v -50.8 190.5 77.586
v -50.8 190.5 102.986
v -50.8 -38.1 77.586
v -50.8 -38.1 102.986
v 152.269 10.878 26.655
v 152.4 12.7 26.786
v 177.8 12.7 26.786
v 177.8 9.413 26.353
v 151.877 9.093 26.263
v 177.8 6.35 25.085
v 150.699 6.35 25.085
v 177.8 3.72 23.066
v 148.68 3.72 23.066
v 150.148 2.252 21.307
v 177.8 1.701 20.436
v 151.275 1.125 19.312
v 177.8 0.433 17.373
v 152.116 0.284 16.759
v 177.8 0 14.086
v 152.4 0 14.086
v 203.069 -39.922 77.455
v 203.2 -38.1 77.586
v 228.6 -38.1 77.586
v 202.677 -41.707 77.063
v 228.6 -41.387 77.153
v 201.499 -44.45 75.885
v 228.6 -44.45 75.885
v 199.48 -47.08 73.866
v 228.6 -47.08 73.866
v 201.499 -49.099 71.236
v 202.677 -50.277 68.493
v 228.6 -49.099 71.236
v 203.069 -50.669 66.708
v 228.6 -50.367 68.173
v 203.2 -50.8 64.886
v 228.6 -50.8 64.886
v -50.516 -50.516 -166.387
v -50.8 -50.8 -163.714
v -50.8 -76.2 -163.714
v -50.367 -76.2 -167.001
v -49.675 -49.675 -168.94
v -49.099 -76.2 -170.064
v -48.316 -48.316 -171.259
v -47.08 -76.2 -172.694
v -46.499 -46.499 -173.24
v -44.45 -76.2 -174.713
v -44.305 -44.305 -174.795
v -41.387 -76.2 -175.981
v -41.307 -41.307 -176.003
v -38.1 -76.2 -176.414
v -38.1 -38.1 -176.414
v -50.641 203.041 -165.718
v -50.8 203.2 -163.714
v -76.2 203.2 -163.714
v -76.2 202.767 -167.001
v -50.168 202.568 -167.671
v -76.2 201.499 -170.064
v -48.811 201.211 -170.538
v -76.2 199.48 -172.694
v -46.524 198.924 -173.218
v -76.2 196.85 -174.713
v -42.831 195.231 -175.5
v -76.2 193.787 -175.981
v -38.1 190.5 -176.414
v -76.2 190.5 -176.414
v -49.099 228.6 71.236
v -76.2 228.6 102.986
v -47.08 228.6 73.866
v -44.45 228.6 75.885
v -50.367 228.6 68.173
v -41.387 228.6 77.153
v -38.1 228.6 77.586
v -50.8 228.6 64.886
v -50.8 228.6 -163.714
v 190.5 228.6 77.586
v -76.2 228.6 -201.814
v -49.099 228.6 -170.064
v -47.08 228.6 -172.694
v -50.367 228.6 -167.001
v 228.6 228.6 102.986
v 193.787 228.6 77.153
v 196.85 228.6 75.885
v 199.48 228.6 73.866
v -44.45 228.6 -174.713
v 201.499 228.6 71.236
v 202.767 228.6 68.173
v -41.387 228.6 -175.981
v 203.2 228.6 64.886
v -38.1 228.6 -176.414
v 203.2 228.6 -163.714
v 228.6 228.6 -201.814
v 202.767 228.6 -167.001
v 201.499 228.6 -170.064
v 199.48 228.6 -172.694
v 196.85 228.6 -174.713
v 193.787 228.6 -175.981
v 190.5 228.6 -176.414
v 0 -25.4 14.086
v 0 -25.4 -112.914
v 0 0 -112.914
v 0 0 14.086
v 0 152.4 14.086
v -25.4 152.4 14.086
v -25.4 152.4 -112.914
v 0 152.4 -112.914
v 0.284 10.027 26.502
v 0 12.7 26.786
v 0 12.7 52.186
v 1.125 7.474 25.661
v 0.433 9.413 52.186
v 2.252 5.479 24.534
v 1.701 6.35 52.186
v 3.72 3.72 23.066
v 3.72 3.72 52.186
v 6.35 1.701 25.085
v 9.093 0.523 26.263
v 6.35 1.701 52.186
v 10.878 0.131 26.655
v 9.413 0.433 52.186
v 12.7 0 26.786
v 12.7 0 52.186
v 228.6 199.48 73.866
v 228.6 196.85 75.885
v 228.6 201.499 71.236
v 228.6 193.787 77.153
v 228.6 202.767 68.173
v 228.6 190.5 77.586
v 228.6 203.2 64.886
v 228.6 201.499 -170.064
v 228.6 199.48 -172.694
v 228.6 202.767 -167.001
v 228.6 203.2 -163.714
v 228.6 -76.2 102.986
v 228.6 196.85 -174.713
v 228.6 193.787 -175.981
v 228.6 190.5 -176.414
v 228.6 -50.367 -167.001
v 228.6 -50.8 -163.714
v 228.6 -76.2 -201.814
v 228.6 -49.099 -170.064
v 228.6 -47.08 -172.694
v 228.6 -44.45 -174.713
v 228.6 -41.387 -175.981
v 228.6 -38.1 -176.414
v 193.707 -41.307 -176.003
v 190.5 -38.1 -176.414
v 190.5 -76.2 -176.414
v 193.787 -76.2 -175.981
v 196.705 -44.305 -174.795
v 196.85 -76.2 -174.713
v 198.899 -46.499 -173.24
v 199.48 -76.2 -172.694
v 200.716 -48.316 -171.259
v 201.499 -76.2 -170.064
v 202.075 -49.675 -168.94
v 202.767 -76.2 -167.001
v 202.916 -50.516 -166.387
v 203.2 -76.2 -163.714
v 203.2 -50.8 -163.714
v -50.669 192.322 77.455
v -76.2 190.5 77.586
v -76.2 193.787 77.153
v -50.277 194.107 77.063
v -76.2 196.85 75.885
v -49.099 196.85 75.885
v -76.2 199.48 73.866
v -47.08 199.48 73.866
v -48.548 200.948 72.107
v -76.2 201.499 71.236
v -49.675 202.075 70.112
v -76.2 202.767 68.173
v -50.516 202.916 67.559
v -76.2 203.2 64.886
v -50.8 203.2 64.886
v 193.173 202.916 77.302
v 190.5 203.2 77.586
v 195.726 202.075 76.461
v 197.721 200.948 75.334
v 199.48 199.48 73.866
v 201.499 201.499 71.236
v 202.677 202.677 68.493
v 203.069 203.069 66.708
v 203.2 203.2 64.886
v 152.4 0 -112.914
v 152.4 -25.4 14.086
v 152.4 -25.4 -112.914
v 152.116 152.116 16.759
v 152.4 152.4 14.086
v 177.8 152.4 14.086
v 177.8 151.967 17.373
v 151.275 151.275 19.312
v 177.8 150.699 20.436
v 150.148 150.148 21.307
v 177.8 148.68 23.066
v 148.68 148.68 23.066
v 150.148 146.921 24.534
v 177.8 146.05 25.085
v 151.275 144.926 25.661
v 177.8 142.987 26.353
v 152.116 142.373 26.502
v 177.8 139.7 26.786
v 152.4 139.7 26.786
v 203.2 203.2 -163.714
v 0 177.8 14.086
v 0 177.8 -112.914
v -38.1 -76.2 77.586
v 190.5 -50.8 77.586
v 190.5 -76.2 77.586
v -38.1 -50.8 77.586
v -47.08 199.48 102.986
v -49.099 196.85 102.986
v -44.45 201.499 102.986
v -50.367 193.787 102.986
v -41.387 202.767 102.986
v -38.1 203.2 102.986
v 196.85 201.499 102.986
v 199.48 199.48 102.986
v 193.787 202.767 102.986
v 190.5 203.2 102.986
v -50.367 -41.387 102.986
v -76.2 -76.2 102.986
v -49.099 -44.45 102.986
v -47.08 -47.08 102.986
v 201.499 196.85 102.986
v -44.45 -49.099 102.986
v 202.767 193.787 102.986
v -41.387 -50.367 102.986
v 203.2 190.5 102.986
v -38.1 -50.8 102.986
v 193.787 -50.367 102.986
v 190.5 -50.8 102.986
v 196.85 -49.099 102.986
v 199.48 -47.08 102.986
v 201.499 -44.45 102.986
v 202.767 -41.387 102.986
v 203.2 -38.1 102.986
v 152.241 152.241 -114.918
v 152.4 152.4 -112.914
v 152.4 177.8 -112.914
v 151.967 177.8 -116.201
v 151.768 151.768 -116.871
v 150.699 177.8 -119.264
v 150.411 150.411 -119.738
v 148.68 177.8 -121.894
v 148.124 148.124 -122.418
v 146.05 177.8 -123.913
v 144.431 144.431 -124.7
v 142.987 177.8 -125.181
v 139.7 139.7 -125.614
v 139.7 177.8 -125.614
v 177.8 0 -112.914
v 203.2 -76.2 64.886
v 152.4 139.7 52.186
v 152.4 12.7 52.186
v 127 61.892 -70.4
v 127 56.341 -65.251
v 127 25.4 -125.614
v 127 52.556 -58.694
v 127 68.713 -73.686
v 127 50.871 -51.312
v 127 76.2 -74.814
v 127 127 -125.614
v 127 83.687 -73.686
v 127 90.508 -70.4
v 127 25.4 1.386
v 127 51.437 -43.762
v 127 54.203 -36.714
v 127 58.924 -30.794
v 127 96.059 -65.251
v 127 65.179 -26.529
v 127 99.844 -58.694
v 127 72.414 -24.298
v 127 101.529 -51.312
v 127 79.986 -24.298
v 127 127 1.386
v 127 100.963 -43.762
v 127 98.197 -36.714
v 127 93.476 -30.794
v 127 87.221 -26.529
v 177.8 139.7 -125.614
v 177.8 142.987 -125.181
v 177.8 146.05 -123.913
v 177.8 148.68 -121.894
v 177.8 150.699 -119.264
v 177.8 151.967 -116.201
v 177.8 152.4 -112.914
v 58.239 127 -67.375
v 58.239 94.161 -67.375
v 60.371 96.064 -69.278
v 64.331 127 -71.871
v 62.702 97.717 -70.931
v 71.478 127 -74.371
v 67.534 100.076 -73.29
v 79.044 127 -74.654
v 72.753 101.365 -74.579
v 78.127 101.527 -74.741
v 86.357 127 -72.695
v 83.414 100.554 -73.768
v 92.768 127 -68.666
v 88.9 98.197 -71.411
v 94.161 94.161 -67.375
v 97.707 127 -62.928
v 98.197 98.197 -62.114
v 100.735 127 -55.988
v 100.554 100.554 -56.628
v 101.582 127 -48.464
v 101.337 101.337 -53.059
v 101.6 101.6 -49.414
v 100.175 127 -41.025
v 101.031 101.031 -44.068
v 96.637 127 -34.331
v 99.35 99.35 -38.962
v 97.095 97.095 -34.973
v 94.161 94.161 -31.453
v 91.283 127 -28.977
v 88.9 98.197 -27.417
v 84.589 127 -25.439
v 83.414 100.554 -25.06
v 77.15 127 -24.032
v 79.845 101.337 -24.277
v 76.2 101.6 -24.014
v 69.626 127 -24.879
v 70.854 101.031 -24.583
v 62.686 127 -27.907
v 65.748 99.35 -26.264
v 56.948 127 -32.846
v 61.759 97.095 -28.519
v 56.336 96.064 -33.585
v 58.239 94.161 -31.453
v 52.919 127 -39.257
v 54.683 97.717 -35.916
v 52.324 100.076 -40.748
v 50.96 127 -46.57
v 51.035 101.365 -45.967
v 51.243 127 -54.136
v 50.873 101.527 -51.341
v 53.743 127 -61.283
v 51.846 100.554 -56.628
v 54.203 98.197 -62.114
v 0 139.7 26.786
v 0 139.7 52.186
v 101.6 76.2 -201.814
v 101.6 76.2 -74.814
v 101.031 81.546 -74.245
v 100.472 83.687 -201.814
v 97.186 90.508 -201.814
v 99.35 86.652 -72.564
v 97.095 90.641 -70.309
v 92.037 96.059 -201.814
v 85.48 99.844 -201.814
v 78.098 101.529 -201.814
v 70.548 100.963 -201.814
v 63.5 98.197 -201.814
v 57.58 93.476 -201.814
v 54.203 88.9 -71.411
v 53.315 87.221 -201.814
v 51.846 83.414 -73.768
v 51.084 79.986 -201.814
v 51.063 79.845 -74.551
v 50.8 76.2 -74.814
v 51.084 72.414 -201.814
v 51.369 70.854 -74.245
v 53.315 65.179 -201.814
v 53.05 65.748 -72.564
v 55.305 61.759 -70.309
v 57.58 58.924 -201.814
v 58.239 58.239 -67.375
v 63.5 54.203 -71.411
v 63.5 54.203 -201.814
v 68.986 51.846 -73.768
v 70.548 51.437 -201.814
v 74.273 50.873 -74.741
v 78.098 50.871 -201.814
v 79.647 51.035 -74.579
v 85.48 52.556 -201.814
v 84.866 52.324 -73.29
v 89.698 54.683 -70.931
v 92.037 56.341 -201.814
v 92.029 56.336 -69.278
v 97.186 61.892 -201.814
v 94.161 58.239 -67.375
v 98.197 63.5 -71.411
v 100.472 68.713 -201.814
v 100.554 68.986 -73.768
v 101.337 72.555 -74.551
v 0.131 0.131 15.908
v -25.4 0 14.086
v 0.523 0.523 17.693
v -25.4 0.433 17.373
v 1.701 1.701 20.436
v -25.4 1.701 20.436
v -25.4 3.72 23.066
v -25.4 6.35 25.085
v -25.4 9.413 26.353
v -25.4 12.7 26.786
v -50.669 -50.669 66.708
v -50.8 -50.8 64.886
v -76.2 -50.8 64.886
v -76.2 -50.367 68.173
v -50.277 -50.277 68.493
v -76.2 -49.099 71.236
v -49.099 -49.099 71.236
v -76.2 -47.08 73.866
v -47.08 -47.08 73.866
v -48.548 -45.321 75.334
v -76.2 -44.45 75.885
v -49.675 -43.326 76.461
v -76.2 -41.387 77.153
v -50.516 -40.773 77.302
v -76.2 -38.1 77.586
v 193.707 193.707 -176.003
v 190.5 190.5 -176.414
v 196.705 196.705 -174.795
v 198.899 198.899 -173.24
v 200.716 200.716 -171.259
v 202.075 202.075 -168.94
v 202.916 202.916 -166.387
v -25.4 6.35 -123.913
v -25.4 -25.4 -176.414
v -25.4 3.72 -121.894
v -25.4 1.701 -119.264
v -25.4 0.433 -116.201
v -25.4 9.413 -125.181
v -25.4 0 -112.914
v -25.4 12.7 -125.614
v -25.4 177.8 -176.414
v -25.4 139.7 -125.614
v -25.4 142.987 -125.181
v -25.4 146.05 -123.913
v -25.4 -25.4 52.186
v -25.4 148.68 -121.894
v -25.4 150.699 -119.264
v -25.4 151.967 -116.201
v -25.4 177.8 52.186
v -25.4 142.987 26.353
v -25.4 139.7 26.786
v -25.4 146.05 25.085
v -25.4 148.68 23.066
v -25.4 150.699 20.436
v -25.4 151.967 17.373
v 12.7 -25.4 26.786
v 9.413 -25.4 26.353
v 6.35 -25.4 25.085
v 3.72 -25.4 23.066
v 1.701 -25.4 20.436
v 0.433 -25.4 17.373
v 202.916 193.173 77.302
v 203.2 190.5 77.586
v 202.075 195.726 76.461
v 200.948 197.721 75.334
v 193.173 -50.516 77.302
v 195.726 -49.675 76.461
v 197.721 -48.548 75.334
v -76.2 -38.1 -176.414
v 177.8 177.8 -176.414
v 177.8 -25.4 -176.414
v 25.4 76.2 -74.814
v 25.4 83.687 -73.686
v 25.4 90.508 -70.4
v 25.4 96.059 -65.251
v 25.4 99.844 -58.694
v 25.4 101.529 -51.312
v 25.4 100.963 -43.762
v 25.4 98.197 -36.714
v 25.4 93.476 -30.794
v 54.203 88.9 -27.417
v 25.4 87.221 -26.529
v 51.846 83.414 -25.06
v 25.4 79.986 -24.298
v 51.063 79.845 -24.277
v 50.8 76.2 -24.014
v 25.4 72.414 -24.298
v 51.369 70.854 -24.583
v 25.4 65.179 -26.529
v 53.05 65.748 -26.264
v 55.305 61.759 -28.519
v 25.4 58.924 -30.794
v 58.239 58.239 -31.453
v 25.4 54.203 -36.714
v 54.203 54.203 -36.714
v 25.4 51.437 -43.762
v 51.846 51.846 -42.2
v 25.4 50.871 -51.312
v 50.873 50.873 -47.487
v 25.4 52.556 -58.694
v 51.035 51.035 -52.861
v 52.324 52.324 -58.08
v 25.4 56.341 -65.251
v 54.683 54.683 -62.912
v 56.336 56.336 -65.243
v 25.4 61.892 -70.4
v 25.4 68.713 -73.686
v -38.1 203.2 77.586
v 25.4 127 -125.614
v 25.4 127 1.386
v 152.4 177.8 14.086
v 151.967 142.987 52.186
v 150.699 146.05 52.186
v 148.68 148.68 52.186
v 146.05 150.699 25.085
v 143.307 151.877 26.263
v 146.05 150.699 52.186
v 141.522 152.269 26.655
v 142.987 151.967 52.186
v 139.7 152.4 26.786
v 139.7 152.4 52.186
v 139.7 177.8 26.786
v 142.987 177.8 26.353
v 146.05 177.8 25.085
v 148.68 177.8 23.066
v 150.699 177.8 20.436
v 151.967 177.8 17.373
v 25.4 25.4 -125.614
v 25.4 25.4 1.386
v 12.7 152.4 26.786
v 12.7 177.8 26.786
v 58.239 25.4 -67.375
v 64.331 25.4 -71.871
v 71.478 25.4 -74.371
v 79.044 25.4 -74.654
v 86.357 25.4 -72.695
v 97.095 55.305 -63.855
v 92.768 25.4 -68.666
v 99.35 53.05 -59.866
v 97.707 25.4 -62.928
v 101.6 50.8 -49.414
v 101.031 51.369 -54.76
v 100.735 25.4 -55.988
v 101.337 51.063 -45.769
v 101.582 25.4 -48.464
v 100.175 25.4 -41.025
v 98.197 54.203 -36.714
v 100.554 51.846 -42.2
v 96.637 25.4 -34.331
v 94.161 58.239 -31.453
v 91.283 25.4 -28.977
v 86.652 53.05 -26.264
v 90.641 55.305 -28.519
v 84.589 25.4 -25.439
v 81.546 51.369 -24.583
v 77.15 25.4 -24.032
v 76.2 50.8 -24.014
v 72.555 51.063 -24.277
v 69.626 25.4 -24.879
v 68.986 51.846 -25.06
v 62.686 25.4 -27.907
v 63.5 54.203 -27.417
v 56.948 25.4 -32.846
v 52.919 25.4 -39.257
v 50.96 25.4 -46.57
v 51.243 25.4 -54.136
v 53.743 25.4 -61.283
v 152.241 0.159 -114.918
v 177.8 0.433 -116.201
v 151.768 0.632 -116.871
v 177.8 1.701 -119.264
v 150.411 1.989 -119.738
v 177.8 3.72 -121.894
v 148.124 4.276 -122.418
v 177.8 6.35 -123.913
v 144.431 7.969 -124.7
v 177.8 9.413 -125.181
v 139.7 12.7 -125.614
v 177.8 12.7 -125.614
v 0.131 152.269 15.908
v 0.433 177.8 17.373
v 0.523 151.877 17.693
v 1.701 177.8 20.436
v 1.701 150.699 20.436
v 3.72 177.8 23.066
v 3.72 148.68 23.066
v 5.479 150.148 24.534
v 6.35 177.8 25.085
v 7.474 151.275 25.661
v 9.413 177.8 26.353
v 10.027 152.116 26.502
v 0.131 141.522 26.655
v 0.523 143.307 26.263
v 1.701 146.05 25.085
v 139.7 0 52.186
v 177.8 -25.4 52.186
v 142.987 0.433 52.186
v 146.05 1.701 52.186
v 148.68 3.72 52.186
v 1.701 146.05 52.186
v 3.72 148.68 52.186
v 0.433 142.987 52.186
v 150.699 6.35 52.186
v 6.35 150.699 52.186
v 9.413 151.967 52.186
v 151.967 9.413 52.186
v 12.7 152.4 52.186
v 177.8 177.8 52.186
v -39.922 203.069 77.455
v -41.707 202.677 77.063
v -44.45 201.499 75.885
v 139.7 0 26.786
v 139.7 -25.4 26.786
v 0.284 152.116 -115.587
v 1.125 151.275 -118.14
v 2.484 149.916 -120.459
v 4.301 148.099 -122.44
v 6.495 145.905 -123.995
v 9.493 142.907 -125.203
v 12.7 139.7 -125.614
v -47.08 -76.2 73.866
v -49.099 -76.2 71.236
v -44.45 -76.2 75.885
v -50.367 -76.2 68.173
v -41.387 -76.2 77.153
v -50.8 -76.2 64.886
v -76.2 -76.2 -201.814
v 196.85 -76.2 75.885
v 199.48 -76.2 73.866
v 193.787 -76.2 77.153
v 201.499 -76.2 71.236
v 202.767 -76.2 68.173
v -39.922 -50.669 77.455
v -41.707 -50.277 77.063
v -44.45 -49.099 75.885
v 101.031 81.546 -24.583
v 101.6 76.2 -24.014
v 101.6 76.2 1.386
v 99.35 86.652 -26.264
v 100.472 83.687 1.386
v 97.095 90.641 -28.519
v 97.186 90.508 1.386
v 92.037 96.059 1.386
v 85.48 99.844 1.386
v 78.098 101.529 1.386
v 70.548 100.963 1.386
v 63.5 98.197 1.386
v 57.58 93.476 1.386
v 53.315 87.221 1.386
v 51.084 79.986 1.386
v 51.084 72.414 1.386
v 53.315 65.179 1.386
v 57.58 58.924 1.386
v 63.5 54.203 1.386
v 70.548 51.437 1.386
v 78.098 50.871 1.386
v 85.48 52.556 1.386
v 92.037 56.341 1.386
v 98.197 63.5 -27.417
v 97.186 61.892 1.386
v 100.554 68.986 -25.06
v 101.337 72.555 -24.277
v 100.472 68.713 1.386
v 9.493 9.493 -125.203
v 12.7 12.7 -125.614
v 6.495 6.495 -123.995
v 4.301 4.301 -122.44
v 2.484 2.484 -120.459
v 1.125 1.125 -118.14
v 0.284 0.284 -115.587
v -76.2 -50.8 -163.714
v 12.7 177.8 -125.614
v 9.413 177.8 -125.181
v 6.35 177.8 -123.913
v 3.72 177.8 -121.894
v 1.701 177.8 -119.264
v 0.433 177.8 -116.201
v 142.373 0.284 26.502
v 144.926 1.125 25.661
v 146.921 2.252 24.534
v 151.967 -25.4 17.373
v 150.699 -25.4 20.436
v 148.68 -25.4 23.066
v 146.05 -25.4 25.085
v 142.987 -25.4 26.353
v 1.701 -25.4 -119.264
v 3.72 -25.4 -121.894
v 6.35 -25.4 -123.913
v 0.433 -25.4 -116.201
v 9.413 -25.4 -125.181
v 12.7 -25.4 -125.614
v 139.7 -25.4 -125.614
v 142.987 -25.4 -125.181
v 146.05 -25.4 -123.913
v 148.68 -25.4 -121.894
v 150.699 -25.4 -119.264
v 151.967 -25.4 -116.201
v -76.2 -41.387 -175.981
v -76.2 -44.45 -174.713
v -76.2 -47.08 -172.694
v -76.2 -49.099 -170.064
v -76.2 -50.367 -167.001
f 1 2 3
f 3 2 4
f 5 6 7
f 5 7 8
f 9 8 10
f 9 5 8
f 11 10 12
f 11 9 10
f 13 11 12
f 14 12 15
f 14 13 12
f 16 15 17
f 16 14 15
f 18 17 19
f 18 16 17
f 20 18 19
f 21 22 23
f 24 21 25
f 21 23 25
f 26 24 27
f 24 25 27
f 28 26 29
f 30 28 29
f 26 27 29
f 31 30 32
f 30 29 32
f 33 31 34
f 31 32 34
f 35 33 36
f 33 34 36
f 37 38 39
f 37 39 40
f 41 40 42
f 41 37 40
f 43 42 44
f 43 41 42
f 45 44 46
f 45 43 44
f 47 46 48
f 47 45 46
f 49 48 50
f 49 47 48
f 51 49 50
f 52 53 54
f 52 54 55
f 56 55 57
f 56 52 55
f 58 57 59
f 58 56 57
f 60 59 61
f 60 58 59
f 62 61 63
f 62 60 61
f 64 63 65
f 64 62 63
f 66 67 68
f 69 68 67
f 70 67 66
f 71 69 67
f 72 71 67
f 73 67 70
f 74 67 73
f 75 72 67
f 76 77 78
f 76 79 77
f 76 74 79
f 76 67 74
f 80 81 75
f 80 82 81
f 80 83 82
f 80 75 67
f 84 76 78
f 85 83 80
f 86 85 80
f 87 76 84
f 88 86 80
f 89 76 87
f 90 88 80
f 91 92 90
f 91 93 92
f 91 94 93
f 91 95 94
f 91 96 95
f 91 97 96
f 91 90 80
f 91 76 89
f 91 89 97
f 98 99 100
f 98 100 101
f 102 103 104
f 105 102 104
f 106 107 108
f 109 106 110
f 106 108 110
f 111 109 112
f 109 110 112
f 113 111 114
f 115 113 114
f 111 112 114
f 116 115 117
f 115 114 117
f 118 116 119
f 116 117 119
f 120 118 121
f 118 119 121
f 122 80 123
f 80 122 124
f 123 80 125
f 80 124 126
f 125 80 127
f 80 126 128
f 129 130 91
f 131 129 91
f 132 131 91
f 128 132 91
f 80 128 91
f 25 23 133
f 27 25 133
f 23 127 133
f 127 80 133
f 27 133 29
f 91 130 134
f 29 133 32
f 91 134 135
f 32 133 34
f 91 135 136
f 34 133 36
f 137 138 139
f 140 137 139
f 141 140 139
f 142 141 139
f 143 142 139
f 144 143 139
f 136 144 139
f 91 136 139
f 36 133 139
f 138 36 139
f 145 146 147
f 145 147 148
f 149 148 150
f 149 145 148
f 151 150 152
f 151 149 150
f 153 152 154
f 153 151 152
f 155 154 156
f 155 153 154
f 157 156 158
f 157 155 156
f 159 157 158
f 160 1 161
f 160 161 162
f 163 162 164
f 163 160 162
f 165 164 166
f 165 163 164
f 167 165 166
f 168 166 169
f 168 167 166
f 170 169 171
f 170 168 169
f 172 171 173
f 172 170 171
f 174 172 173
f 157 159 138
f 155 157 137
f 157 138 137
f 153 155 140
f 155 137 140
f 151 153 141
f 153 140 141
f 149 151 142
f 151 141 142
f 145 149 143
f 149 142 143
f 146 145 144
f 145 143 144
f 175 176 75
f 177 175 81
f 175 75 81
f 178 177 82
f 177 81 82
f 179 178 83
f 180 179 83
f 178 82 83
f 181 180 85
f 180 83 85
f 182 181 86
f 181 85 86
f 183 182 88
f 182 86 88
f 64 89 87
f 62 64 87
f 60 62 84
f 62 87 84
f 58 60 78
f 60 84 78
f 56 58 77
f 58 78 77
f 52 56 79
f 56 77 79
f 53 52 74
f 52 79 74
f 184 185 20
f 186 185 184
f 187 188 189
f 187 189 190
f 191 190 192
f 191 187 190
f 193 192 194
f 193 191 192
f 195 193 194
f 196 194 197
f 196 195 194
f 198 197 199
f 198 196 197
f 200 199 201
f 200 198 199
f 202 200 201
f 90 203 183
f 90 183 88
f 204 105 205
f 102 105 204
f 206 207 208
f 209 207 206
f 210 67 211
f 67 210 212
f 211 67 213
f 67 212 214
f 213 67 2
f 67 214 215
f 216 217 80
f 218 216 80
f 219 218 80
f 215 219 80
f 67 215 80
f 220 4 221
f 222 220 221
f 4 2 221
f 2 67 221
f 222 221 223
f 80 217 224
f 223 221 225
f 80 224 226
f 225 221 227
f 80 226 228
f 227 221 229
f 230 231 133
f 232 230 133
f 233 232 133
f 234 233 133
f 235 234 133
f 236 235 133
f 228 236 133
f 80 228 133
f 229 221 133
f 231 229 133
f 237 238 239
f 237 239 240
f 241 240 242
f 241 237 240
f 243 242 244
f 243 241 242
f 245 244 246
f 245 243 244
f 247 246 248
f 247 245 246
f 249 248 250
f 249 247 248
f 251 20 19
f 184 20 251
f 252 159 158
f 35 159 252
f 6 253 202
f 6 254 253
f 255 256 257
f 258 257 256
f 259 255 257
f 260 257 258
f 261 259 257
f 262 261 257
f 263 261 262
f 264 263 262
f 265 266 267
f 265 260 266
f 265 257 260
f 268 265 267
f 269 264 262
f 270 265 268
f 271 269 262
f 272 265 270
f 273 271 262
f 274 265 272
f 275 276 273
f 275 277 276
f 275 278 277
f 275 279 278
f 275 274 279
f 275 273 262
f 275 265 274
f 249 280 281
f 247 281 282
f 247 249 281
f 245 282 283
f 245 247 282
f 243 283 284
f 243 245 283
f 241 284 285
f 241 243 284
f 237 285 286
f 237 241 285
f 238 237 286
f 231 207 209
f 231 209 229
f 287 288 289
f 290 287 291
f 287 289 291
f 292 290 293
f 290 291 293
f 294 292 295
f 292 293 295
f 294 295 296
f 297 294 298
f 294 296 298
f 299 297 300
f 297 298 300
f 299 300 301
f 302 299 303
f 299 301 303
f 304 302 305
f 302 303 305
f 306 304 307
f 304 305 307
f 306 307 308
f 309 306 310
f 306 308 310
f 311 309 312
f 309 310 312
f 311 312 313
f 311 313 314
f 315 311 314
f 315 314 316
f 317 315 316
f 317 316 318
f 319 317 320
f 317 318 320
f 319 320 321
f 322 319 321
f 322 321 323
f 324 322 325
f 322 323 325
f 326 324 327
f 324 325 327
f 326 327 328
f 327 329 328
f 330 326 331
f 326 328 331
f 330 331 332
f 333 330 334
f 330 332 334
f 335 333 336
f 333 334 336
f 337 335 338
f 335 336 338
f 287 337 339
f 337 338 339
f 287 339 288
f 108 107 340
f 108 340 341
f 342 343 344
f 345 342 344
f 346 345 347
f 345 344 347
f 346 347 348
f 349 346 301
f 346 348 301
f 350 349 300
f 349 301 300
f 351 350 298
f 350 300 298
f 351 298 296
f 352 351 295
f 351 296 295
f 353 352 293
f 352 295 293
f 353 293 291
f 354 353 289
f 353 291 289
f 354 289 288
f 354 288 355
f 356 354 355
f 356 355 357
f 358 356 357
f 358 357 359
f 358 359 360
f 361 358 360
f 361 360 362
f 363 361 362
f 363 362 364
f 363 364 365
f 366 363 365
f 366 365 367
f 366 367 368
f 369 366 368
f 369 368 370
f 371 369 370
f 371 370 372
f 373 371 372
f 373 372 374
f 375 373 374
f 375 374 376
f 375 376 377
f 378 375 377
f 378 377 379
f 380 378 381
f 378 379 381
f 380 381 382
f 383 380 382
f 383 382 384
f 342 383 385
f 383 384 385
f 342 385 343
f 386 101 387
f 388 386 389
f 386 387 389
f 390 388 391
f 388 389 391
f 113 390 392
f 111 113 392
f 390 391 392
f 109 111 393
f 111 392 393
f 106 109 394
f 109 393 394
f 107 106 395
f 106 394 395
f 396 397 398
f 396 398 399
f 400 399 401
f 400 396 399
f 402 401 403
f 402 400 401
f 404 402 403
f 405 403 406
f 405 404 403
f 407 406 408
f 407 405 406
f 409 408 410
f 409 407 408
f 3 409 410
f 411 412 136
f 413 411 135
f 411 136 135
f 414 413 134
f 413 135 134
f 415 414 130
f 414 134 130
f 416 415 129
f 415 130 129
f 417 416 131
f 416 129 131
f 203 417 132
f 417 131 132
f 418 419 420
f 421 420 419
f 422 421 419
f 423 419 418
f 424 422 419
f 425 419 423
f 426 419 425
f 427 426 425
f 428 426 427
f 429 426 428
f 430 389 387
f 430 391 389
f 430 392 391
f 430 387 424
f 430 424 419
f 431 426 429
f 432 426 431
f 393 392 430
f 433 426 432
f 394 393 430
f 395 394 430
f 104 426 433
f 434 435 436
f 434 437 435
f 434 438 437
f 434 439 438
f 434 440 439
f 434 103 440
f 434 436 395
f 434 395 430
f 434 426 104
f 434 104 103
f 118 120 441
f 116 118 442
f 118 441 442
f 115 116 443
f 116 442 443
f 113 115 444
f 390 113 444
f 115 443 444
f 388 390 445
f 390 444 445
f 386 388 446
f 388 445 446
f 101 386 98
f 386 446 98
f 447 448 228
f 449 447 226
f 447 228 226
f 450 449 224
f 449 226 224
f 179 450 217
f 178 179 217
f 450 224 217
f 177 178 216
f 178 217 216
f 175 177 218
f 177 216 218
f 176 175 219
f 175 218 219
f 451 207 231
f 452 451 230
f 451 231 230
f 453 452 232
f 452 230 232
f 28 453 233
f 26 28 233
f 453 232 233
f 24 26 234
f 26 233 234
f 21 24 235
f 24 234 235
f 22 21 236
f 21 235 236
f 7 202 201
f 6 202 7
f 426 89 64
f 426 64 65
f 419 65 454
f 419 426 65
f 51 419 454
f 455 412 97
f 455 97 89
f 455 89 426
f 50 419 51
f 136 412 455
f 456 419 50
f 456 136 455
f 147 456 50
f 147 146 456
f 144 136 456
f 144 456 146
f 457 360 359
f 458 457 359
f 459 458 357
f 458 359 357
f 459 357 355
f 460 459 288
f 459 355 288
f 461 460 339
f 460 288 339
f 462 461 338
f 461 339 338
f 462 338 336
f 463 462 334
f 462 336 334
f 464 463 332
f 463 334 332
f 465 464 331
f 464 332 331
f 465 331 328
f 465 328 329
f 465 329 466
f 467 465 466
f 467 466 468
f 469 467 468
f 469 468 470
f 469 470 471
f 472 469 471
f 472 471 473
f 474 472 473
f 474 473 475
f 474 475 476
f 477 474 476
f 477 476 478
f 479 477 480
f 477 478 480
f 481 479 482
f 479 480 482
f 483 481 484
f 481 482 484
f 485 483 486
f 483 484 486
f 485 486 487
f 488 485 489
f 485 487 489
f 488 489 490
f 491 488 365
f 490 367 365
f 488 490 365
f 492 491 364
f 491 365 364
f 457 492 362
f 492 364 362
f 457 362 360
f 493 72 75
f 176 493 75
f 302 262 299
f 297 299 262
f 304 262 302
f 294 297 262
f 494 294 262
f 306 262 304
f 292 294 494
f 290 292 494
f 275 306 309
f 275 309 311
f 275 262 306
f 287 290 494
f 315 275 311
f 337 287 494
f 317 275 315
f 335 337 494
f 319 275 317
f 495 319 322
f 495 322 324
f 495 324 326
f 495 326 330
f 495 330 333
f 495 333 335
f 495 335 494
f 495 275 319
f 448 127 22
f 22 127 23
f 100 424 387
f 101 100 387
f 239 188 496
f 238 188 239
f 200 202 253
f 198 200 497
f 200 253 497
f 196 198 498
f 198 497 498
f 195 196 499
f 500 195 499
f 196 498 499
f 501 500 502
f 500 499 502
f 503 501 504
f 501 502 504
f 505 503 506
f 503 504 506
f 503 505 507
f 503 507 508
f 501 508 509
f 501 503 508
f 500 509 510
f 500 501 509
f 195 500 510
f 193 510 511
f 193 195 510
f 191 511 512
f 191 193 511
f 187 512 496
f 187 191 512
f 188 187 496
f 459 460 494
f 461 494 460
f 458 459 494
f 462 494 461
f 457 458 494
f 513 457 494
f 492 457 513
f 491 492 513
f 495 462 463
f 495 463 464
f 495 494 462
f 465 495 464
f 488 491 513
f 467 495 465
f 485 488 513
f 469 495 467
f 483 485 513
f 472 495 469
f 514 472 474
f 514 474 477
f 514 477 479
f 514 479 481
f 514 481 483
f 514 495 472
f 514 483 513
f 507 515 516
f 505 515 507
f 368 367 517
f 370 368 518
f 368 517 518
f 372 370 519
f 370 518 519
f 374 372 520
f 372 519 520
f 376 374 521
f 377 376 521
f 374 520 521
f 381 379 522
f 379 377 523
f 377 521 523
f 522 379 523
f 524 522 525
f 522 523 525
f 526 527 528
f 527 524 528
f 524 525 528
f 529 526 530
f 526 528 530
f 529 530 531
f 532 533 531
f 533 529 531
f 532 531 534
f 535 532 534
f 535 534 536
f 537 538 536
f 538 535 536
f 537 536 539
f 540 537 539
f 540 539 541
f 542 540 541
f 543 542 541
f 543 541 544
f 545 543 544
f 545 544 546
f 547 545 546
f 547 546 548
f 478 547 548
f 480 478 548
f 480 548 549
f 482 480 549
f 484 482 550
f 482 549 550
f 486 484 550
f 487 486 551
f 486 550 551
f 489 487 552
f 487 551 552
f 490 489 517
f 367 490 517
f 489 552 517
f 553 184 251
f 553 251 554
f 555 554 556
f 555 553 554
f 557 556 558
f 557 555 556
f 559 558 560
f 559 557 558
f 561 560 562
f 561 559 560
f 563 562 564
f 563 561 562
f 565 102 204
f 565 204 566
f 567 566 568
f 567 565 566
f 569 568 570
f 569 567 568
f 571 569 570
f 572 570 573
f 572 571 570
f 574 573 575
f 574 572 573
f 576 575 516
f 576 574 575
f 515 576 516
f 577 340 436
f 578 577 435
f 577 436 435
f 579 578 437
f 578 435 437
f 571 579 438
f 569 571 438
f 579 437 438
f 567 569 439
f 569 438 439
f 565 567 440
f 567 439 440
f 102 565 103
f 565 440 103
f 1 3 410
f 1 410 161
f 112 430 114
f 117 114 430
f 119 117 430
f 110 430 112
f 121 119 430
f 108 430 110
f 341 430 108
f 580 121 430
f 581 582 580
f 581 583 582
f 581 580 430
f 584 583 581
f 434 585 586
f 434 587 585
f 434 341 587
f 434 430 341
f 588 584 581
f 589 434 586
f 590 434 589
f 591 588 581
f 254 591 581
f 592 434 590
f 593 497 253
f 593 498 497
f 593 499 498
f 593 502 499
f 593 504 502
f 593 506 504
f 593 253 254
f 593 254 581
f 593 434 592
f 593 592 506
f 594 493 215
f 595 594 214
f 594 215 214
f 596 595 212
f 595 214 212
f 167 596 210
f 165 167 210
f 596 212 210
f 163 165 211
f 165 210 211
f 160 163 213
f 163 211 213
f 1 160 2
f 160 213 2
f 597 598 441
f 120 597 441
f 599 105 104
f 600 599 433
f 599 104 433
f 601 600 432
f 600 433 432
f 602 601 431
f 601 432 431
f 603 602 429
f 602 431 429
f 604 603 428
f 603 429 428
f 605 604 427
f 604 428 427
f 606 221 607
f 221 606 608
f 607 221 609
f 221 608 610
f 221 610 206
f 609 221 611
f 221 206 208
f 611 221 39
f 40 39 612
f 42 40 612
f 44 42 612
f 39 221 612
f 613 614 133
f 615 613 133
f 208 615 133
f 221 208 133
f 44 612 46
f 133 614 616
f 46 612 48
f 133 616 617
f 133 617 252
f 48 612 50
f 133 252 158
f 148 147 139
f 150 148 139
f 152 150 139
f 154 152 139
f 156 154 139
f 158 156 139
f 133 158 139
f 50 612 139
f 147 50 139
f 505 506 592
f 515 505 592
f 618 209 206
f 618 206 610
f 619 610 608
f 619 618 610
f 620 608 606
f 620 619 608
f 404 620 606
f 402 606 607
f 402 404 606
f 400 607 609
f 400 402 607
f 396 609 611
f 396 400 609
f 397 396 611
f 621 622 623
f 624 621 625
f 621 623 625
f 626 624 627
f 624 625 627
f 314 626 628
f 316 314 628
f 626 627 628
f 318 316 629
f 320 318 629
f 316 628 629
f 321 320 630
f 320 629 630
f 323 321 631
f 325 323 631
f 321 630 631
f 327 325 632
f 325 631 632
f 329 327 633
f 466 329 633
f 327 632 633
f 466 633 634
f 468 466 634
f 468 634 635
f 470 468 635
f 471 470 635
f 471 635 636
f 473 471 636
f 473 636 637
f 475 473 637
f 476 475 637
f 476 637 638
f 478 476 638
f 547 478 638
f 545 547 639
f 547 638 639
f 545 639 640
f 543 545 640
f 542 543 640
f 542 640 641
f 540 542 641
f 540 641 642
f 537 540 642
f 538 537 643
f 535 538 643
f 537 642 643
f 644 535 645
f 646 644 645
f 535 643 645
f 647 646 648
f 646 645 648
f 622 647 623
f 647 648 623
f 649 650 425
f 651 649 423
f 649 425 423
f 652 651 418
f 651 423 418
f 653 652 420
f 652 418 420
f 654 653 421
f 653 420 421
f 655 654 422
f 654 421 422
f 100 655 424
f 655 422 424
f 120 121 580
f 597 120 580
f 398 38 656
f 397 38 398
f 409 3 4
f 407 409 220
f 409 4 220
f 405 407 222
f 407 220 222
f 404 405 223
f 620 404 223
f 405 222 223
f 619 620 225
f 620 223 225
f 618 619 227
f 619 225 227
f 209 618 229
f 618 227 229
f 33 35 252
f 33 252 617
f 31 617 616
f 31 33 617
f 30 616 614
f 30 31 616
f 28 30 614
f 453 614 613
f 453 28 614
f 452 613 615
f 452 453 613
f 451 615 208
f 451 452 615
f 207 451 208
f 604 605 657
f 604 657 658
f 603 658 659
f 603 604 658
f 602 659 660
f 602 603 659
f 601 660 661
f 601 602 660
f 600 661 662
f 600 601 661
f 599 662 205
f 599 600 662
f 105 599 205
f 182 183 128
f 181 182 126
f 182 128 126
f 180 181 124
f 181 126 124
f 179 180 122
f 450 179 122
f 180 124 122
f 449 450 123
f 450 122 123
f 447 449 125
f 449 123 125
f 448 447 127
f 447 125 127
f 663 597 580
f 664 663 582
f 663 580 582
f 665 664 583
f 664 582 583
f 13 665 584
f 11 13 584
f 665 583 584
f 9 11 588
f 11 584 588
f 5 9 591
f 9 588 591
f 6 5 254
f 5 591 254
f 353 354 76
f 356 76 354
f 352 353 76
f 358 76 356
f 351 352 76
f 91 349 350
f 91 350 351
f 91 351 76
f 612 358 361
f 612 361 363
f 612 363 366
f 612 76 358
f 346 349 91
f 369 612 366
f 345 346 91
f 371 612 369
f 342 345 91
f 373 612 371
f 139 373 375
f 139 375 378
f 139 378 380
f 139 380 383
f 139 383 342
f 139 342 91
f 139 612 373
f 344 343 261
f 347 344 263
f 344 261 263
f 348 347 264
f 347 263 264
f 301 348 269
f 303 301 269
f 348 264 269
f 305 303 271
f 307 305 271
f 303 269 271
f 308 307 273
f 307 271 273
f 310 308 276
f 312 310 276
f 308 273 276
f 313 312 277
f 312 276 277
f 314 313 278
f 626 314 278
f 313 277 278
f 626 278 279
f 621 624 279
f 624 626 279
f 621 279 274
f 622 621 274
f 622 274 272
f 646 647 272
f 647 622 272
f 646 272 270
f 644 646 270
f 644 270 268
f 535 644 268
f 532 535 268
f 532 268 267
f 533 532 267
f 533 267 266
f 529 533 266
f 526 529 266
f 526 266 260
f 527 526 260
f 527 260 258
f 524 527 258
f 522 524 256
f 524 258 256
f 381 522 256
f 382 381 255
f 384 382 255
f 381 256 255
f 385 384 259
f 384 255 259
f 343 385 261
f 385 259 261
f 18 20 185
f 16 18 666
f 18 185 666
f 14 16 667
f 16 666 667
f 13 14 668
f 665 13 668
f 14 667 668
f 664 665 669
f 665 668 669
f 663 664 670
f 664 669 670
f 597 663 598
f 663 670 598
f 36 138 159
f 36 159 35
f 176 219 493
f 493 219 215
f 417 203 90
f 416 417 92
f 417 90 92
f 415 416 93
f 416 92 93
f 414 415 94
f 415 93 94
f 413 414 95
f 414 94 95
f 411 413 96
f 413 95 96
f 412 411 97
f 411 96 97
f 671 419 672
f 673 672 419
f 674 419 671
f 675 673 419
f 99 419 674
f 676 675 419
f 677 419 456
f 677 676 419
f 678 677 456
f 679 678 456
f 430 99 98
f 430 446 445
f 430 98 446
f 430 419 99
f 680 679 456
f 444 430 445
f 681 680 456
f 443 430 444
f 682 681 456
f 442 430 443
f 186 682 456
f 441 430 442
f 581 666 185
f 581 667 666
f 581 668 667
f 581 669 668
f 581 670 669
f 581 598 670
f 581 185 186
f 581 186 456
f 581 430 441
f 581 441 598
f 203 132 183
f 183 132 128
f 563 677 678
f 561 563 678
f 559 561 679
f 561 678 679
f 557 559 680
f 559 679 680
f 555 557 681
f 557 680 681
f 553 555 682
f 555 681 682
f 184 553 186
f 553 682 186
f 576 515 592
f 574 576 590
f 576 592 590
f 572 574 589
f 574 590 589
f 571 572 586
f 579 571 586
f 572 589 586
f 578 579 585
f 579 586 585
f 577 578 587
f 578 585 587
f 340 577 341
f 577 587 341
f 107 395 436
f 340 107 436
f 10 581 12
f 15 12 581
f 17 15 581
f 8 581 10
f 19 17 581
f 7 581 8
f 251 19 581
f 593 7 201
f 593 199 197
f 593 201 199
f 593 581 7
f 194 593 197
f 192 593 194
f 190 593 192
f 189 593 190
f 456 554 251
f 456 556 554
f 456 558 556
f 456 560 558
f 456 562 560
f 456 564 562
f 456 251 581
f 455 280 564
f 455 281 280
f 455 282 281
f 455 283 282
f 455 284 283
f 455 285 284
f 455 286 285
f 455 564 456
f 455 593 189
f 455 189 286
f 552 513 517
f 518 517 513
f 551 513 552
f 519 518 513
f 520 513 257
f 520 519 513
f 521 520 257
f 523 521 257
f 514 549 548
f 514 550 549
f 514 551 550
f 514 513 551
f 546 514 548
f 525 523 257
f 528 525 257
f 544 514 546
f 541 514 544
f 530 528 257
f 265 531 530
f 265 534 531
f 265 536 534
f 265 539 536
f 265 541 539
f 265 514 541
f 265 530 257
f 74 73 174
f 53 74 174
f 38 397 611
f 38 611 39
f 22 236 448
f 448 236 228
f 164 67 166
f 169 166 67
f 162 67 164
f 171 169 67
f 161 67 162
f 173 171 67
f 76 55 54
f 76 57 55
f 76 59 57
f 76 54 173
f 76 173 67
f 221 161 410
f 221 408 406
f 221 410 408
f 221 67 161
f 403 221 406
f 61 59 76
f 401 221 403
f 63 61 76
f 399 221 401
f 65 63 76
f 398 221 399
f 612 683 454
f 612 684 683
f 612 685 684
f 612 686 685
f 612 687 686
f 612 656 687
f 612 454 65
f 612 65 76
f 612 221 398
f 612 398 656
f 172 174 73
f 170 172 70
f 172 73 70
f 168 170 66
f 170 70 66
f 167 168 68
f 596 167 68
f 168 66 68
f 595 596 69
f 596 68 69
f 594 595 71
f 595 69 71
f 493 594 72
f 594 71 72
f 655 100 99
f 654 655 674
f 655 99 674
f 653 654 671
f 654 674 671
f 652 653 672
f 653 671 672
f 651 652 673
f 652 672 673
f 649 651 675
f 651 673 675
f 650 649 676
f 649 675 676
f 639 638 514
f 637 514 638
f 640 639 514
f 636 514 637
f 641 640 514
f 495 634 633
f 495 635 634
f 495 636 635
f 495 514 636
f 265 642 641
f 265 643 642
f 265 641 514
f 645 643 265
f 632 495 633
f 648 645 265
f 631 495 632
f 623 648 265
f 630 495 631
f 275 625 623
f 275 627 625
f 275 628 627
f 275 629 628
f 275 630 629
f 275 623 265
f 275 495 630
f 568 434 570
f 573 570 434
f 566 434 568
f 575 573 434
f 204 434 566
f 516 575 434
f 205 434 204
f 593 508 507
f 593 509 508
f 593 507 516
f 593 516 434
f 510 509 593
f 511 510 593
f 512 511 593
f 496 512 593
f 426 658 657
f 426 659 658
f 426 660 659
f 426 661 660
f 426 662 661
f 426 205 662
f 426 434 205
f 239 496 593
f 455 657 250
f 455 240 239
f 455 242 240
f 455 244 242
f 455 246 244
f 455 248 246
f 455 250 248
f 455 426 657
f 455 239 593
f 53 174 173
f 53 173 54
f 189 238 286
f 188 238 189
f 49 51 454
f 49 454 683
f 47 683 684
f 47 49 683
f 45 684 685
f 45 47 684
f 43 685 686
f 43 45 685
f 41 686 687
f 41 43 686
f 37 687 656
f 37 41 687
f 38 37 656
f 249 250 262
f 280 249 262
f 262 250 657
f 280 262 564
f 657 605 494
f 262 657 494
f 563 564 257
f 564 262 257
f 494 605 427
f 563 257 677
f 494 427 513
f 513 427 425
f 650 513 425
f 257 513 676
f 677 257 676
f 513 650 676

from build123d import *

# Parameters (mm, degrees)
SKETCH1_W           = 152.4
SKETCH1_H           = 152.4
EXTRUDE2_DEPTH      = 152.4
CUT_EXTRUDE14_DEPTH = 25.4
CUT_EXTRUDE18_DEPTH = 25.4
CUT_EXTRUDE19_DEPTH = 25.4
CUT_EXTRUDE21_START = -25.4
CUT_EXTRUDE21_DEPTH = 25.4
CUT_EXTRUDE22_START = -25.4
CUT_EXTRUDE22_DEPTH = 25.4
CUT_EXTRUDE24_DEPTH = 25.4
CUT_EXTRUDE27_DEPTH = 25.4
CUT_EXTRUDE28_START = -25.4
CUT_EXTRUDE28_DEPTH = 25.4
CUT_EXTRUDE29_DEPTH = 25.4
CUT_EXTRUDE30_START = -25.4
CUT_EXTRUDE30_DEPTH = 25.4
SKETCH30_R          = 12.7
CUT_EXTRUDE31_DEPTH = 239.273120599
SKETCH31_R          = 12.7
CUT_EXTRUDE32_DEPTH = 239.273120599
SKETCH32_R          = 12.7
CUT_EXTRUDE33_DEPTH = 239.273120599
SCALE1_SCALE        = 2


with BuildPart() as part:
    # Sketch1 → Extrude2 (new body)
    with BuildSketch(Plane(origin=(0, 0, 0), x_dir=(1, 0, 0), z_dir=(0, 1, 0))):
        with Locations((76.2, 76.2)):
            Rectangle(SKETCH1_W, SKETCH1_H)
    extrude(amount=EXTRUDE2_DEPTH)

    # Sketch13 → Cut-Extrude14 (cut)
    with BuildSketch(Plane(origin=(0, 152.4, 0), x_dir=(1, 0, 0), z_dir=(0, 1, 0))):
        with BuildLine():
            Line((19.05, 12.7), (133.35, 12.7))
            ThreePointArc((133.35, 12.7), (137.840128061, 14.559871939), (139.7, 19.05))
            Line((139.7, 19.05), (139.7, 133.35))
            ThreePointArc((139.7, 133.35), (137.840128061, 137.840128061), (133.35, 139.7))
            Line((133.35, 139.7), (19.05, 139.7))
            ThreePointArc((19.05, 139.7), (14.559871939, 137.840128061), (12.7, 133.35))
            Line((12.7, 133.35), (12.7, 19.05))
            ThreePointArc((12.7, 19.05), (14.559871939, 14.559871939), (19.05, 12.7))
        make_face()
    extrude(amount=-CUT_EXTRUDE14_DEPTH, mode=Mode.SUBTRACT)

    # Sketch17 → Cut-Extrude18 (cut)
    with BuildSketch(Plane.XY):
        with BuildLine():
            Line((19.05, 12.7), (133.35, 12.7))
            ThreePointArc((133.35, 12.7), (137.840128061, 14.559871939), (139.7, 19.05))
            Line((139.7, 19.05), (139.7, 133.35))
            ThreePointArc((139.7, 133.35), (137.840128061, 137.840128061), (133.35, 139.7))
            Line((133.35, 139.7), (19.05, 139.7))
            ThreePointArc((19.05, 139.7), (14.559871939, 137.840128061), (12.7, 133.35))
            Line((12.7, 133.35), (12.7, 19.05))
            ThreePointArc((12.7, 19.05), (14.559871939, 14.559871939), (19.05, 12.7))
        make_face()
    extrude(amount=-CUT_EXTRUDE18_DEPTH, mode=Mode.SUBTRACT)

    # Sketch18 → Cut-Extrude19 (cut)
    with BuildSketch(Plane(origin=(152.4, 0, 0), x_dir=(0, 0, -1), z_dir=(1, 0, 0))):
        with BuildLine():
            Line((19.05, 12.7), (133.35, 12.7))
            ThreePointArc((133.35, 12.7), (137.840128061, 14.559871939), (139.7, 19.05))
            Line((139.7, 19.05), (139.7, 133.35))
            ThreePointArc((139.7, 133.35), (137.840128061, 137.840128061), (133.35, 139.7))
            Line((133.35, 139.7), (19.05, 139.7))
            ThreePointArc((19.05, 139.7), (14.559871939, 137.840128061), (12.7, 133.35))
            Line((12.7, 133.35), (12.7, 19.05))
            ThreePointArc((12.7, 19.05), (14.559871939, 14.559871939), (19.05, 12.7))
        make_face()
    extrude(amount=-CUT_EXTRUDE19_DEPTH, mode=Mode.SUBTRACT)

    # Sketch20 → Cut-Extrude21 (cut)
    with BuildSketch(Plane.ZY.offset(CUT_EXTRUDE21_START)):
        with BuildLine():
            Line((-133.35, 12.7), (-19.05, 12.7))
            ThreePointArc((-19.05, 12.7), (-14.559871939, 14.559871939), (-12.7, 19.05))
            Line((-12.7, 19.05), (-12.7, 133.35))
            ThreePointArc((-12.7, 133.35), (-14.559871939, 137.840128061), (-19.05, 139.7))
            Line((-19.05, 139.7), (-133.35, 139.7))
            ThreePointArc((-133.35, 139.7), (-137.840128061, 137.840128061), (-139.7, 133.35))
            Line((-139.7, 133.35), (-139.7, 19.05))
            ThreePointArc((-139.7, 19.05), (-137.840128061, 14.559871939), (-133.35, 12.7))
        make_face()
    extrude(amount=CUT_EXTRUDE21_DEPTH, mode=Mode.SUBTRACT)

    # Sketch21 → Cut-Extrude22 (cut)
    with BuildSketch(Plane.XZ.offset(CUT_EXTRUDE22_START)):
        with BuildLine():
            Line((19.05, -139.7), (133.35, -139.7))
            ThreePointArc((133.35, -139.7), (137.840128061, -137.840128061), (139.7, -133.35))
            Line((139.7, -133.35), (139.7, -19.05))
            ThreePointArc((139.7, -19.05), (137.840128061, -14.559871939), (133.35, -12.7))
            Line((133.35, -12.7), (19.05, -12.7))
            ThreePointArc((19.05, -12.7), (14.559871939, -14.559871939), (12.7, -19.05))
            Line((12.7, -19.05), (12.7, -133.35))
            ThreePointArc((12.7, -133.35), (14.559871939, -137.840128061), (19.05, -139.7))
        make_face()
    extrude(amount=CUT_EXTRUDE22_DEPTH, mode=Mode.SUBTRACT)

    # Sketch23 → Cut-Extrude24 (cut)
    with BuildSketch(Plane.XY.offset(-25.4)):
        with BuildLine():
            Line((44.45, 38.1), (107.95, 38.1))
            ThreePointArc((107.95, 38.1), (112.440128061, 39.959871939), (114.3, 44.45))
            Line((114.3, 44.45), (114.3, 107.95))
            ThreePointArc((114.3, 107.95), (112.440128061, 112.440128061), (107.95, 114.3))
            Line((107.95, 114.3), (44.45, 114.3))
            ThreePointArc((44.45, 114.3), (39.959871939, 112.440128061), (38.1, 107.95))
            Line((38.1, 107.95), (38.1, 44.45))
            ThreePointArc((38.1, 44.45), (39.959871939, 39.959871939), (44.45, 38.1))
        make_face()
    extrude(amount=-CUT_EXTRUDE24_DEPTH, mode=Mode.SUBTRACT)

    # Sketch26 → Cut-Extrude27 (cut)
    with BuildSketch(Plane.XZ.offset(-25.4)):
        with BuildLine():
            Line((44.45, -114.3), (107.95, -114.3))
            ThreePointArc((107.95, -114.3), (112.440128061, -112.440128061), (114.3, -107.95))
            Line((114.3, -107.95), (114.3, -44.45))
            ThreePointArc((114.3, -44.45), (112.440128061, -39.959871939), (107.95, -38.1))
            Line((107.95, -38.1), (44.45, -38.1))
            ThreePointArc((44.45, -38.1), (39.959871939, -39.959871939), (38.1, -44.45))
            Line((38.1, -44.45), (38.1, -107.95))
            ThreePointArc((38.1, -107.95), (39.959871939, -112.440128061), (44.45, -114.3))
        make_face()
    extrude(amount=-CUT_EXTRUDE27_DEPTH, mode=Mode.SUBTRACT)

    # Sketch27 → Cut-Extrude28 (cut)
    with BuildSketch(Plane(origin=(0, 127, 0), x_dir=(-1, 0, 0), z_dir=(0, 1, 0)).offset(CUT_EXTRUDE28_START)):
        with BuildLine():
            Line((-107.95, -114.3), (-44.45, -114.3))
            ThreePointArc((-44.45, -114.3), (-39.959871939, -112.440128061), (-38.1, -107.95))
            Line((-38.1, -107.95), (-38.1, -44.45))
            ThreePointArc((-38.1, -44.45), (-39.959871939, -39.959871939), (-44.45, -38.1))
            Line((-44.45, -38.1), (-107.95, -38.1))
            ThreePointArc((-107.95, -38.1), (-112.440128061, -39.959871939), (-114.3, -44.45))
            Line((-114.3, -44.45), (-114.3, -107.95))
            ThreePointArc((-114.3, -107.95), (-112.440128061, -112.440128061), (-107.95, -114.3))
        make_face()
    extrude(amount=CUT_EXTRUDE28_DEPTH, mode=Mode.SUBTRACT)

    # Sketch28 → Cut-Extrude29 (cut)
    with BuildSketch(Plane(origin=(25.4, 0, 0), x_dir=(0, -1, 0), z_dir=(-1, 0, 0))):
        with BuildLine():
            Line((-107.95, -114.3), (-44.45, -114.3))
            ThreePointArc((-44.45, -114.3), (-39.959871939, -112.440128061), (-38.1, -107.95))
            Line((-38.1, -107.95), (-38.1, -44.45))
            ThreePointArc((-38.1, -44.45), (-39.959871939, -39.959871939), (-44.45, -38.1))
            Line((-44.45, -38.1), (-107.95, -38.1))
            ThreePointArc((-107.95, -38.1), (-112.440128061, -39.959871939), (-114.3, -44.45))
            Line((-114.3, -44.45), (-114.3, -107.95))
            ThreePointArc((-114.3, -107.95), (-112.440128061, -112.440128061), (-107.95, -114.3))
        make_face()
    extrude(amount=-CUT_EXTRUDE29_DEPTH, mode=Mode.SUBTRACT)

    # Sketch29 → Cut-Extrude30 (cut)
    with BuildSketch(Plane.YZ.offset(127).offset(CUT_EXTRUDE30_START)):
        with BuildLine():
            Line((44.45, -114.3), (107.95, -114.3))
            ThreePointArc((107.95, -114.3), (112.440128061, -112.440128061), (114.3, -107.95))
            Line((114.3, -107.95), (114.3, -44.45))
            ThreePointArc((114.3, -44.45), (112.440128061, -39.959871939), (107.95, -38.1))
            Line((107.95, -38.1), (44.45, -38.1))
            ThreePointArc((44.45, -38.1), (39.959871939, -39.959871939), (38.1, -44.45))
            Line((38.1, -44.45), (38.1, -107.95))
            ThreePointArc((38.1, -107.95), (39.959871939, -112.440128061), (44.45, -114.3))
        make_face()
    extrude(amount=CUT_EXTRUDE30_DEPTH, mode=Mode.SUBTRACT)

    # Sketch30 → Cut-Extrude31 (cut, through all)
    with BuildSketch(Plane.XY.offset(-50.8)):
        with Locations((76.2, 76.2)):
            Circle(SKETCH30_R)
    extrude(amount=-CUT_EXTRUDE31_DEPTH, mode=Mode.SUBTRACT)

    # Sketch31 → Cut-Extrude32 (cut, through all)
    with BuildSketch(Plane(origin=(101.6, 0, 0), x_dir=(0, 0, -1), z_dir=(1, 0, 0))):
        with Locations((76.2, 76.2)):
            Circle(SKETCH31_R)
    extrude(amount=-CUT_EXTRUDE32_DEPTH, mode=Mode.SUBTRACT)

    # Sketch32 → Cut-Extrude33 (cut, through all)
    with BuildSketch(Plane.XZ.offset(-50.8)):
        with Locations(Location((76.2, -76.2, 0), (0, 0, 225))):
            Circle(SKETCH32_R)
    extrude(amount=-CUT_EXTRUDE33_DEPTH, mode=Mode.SUBTRACT)


with BuildPart() as part_1:
    # Scale1: scaled about (76.199999991, 76.199999991, -102.985994001)
    add(part.part.scale(SCALE1_SCALE).moved(Location((-76.199999991, -76.199999991, 102.985994001))))


solid = part_1.part
